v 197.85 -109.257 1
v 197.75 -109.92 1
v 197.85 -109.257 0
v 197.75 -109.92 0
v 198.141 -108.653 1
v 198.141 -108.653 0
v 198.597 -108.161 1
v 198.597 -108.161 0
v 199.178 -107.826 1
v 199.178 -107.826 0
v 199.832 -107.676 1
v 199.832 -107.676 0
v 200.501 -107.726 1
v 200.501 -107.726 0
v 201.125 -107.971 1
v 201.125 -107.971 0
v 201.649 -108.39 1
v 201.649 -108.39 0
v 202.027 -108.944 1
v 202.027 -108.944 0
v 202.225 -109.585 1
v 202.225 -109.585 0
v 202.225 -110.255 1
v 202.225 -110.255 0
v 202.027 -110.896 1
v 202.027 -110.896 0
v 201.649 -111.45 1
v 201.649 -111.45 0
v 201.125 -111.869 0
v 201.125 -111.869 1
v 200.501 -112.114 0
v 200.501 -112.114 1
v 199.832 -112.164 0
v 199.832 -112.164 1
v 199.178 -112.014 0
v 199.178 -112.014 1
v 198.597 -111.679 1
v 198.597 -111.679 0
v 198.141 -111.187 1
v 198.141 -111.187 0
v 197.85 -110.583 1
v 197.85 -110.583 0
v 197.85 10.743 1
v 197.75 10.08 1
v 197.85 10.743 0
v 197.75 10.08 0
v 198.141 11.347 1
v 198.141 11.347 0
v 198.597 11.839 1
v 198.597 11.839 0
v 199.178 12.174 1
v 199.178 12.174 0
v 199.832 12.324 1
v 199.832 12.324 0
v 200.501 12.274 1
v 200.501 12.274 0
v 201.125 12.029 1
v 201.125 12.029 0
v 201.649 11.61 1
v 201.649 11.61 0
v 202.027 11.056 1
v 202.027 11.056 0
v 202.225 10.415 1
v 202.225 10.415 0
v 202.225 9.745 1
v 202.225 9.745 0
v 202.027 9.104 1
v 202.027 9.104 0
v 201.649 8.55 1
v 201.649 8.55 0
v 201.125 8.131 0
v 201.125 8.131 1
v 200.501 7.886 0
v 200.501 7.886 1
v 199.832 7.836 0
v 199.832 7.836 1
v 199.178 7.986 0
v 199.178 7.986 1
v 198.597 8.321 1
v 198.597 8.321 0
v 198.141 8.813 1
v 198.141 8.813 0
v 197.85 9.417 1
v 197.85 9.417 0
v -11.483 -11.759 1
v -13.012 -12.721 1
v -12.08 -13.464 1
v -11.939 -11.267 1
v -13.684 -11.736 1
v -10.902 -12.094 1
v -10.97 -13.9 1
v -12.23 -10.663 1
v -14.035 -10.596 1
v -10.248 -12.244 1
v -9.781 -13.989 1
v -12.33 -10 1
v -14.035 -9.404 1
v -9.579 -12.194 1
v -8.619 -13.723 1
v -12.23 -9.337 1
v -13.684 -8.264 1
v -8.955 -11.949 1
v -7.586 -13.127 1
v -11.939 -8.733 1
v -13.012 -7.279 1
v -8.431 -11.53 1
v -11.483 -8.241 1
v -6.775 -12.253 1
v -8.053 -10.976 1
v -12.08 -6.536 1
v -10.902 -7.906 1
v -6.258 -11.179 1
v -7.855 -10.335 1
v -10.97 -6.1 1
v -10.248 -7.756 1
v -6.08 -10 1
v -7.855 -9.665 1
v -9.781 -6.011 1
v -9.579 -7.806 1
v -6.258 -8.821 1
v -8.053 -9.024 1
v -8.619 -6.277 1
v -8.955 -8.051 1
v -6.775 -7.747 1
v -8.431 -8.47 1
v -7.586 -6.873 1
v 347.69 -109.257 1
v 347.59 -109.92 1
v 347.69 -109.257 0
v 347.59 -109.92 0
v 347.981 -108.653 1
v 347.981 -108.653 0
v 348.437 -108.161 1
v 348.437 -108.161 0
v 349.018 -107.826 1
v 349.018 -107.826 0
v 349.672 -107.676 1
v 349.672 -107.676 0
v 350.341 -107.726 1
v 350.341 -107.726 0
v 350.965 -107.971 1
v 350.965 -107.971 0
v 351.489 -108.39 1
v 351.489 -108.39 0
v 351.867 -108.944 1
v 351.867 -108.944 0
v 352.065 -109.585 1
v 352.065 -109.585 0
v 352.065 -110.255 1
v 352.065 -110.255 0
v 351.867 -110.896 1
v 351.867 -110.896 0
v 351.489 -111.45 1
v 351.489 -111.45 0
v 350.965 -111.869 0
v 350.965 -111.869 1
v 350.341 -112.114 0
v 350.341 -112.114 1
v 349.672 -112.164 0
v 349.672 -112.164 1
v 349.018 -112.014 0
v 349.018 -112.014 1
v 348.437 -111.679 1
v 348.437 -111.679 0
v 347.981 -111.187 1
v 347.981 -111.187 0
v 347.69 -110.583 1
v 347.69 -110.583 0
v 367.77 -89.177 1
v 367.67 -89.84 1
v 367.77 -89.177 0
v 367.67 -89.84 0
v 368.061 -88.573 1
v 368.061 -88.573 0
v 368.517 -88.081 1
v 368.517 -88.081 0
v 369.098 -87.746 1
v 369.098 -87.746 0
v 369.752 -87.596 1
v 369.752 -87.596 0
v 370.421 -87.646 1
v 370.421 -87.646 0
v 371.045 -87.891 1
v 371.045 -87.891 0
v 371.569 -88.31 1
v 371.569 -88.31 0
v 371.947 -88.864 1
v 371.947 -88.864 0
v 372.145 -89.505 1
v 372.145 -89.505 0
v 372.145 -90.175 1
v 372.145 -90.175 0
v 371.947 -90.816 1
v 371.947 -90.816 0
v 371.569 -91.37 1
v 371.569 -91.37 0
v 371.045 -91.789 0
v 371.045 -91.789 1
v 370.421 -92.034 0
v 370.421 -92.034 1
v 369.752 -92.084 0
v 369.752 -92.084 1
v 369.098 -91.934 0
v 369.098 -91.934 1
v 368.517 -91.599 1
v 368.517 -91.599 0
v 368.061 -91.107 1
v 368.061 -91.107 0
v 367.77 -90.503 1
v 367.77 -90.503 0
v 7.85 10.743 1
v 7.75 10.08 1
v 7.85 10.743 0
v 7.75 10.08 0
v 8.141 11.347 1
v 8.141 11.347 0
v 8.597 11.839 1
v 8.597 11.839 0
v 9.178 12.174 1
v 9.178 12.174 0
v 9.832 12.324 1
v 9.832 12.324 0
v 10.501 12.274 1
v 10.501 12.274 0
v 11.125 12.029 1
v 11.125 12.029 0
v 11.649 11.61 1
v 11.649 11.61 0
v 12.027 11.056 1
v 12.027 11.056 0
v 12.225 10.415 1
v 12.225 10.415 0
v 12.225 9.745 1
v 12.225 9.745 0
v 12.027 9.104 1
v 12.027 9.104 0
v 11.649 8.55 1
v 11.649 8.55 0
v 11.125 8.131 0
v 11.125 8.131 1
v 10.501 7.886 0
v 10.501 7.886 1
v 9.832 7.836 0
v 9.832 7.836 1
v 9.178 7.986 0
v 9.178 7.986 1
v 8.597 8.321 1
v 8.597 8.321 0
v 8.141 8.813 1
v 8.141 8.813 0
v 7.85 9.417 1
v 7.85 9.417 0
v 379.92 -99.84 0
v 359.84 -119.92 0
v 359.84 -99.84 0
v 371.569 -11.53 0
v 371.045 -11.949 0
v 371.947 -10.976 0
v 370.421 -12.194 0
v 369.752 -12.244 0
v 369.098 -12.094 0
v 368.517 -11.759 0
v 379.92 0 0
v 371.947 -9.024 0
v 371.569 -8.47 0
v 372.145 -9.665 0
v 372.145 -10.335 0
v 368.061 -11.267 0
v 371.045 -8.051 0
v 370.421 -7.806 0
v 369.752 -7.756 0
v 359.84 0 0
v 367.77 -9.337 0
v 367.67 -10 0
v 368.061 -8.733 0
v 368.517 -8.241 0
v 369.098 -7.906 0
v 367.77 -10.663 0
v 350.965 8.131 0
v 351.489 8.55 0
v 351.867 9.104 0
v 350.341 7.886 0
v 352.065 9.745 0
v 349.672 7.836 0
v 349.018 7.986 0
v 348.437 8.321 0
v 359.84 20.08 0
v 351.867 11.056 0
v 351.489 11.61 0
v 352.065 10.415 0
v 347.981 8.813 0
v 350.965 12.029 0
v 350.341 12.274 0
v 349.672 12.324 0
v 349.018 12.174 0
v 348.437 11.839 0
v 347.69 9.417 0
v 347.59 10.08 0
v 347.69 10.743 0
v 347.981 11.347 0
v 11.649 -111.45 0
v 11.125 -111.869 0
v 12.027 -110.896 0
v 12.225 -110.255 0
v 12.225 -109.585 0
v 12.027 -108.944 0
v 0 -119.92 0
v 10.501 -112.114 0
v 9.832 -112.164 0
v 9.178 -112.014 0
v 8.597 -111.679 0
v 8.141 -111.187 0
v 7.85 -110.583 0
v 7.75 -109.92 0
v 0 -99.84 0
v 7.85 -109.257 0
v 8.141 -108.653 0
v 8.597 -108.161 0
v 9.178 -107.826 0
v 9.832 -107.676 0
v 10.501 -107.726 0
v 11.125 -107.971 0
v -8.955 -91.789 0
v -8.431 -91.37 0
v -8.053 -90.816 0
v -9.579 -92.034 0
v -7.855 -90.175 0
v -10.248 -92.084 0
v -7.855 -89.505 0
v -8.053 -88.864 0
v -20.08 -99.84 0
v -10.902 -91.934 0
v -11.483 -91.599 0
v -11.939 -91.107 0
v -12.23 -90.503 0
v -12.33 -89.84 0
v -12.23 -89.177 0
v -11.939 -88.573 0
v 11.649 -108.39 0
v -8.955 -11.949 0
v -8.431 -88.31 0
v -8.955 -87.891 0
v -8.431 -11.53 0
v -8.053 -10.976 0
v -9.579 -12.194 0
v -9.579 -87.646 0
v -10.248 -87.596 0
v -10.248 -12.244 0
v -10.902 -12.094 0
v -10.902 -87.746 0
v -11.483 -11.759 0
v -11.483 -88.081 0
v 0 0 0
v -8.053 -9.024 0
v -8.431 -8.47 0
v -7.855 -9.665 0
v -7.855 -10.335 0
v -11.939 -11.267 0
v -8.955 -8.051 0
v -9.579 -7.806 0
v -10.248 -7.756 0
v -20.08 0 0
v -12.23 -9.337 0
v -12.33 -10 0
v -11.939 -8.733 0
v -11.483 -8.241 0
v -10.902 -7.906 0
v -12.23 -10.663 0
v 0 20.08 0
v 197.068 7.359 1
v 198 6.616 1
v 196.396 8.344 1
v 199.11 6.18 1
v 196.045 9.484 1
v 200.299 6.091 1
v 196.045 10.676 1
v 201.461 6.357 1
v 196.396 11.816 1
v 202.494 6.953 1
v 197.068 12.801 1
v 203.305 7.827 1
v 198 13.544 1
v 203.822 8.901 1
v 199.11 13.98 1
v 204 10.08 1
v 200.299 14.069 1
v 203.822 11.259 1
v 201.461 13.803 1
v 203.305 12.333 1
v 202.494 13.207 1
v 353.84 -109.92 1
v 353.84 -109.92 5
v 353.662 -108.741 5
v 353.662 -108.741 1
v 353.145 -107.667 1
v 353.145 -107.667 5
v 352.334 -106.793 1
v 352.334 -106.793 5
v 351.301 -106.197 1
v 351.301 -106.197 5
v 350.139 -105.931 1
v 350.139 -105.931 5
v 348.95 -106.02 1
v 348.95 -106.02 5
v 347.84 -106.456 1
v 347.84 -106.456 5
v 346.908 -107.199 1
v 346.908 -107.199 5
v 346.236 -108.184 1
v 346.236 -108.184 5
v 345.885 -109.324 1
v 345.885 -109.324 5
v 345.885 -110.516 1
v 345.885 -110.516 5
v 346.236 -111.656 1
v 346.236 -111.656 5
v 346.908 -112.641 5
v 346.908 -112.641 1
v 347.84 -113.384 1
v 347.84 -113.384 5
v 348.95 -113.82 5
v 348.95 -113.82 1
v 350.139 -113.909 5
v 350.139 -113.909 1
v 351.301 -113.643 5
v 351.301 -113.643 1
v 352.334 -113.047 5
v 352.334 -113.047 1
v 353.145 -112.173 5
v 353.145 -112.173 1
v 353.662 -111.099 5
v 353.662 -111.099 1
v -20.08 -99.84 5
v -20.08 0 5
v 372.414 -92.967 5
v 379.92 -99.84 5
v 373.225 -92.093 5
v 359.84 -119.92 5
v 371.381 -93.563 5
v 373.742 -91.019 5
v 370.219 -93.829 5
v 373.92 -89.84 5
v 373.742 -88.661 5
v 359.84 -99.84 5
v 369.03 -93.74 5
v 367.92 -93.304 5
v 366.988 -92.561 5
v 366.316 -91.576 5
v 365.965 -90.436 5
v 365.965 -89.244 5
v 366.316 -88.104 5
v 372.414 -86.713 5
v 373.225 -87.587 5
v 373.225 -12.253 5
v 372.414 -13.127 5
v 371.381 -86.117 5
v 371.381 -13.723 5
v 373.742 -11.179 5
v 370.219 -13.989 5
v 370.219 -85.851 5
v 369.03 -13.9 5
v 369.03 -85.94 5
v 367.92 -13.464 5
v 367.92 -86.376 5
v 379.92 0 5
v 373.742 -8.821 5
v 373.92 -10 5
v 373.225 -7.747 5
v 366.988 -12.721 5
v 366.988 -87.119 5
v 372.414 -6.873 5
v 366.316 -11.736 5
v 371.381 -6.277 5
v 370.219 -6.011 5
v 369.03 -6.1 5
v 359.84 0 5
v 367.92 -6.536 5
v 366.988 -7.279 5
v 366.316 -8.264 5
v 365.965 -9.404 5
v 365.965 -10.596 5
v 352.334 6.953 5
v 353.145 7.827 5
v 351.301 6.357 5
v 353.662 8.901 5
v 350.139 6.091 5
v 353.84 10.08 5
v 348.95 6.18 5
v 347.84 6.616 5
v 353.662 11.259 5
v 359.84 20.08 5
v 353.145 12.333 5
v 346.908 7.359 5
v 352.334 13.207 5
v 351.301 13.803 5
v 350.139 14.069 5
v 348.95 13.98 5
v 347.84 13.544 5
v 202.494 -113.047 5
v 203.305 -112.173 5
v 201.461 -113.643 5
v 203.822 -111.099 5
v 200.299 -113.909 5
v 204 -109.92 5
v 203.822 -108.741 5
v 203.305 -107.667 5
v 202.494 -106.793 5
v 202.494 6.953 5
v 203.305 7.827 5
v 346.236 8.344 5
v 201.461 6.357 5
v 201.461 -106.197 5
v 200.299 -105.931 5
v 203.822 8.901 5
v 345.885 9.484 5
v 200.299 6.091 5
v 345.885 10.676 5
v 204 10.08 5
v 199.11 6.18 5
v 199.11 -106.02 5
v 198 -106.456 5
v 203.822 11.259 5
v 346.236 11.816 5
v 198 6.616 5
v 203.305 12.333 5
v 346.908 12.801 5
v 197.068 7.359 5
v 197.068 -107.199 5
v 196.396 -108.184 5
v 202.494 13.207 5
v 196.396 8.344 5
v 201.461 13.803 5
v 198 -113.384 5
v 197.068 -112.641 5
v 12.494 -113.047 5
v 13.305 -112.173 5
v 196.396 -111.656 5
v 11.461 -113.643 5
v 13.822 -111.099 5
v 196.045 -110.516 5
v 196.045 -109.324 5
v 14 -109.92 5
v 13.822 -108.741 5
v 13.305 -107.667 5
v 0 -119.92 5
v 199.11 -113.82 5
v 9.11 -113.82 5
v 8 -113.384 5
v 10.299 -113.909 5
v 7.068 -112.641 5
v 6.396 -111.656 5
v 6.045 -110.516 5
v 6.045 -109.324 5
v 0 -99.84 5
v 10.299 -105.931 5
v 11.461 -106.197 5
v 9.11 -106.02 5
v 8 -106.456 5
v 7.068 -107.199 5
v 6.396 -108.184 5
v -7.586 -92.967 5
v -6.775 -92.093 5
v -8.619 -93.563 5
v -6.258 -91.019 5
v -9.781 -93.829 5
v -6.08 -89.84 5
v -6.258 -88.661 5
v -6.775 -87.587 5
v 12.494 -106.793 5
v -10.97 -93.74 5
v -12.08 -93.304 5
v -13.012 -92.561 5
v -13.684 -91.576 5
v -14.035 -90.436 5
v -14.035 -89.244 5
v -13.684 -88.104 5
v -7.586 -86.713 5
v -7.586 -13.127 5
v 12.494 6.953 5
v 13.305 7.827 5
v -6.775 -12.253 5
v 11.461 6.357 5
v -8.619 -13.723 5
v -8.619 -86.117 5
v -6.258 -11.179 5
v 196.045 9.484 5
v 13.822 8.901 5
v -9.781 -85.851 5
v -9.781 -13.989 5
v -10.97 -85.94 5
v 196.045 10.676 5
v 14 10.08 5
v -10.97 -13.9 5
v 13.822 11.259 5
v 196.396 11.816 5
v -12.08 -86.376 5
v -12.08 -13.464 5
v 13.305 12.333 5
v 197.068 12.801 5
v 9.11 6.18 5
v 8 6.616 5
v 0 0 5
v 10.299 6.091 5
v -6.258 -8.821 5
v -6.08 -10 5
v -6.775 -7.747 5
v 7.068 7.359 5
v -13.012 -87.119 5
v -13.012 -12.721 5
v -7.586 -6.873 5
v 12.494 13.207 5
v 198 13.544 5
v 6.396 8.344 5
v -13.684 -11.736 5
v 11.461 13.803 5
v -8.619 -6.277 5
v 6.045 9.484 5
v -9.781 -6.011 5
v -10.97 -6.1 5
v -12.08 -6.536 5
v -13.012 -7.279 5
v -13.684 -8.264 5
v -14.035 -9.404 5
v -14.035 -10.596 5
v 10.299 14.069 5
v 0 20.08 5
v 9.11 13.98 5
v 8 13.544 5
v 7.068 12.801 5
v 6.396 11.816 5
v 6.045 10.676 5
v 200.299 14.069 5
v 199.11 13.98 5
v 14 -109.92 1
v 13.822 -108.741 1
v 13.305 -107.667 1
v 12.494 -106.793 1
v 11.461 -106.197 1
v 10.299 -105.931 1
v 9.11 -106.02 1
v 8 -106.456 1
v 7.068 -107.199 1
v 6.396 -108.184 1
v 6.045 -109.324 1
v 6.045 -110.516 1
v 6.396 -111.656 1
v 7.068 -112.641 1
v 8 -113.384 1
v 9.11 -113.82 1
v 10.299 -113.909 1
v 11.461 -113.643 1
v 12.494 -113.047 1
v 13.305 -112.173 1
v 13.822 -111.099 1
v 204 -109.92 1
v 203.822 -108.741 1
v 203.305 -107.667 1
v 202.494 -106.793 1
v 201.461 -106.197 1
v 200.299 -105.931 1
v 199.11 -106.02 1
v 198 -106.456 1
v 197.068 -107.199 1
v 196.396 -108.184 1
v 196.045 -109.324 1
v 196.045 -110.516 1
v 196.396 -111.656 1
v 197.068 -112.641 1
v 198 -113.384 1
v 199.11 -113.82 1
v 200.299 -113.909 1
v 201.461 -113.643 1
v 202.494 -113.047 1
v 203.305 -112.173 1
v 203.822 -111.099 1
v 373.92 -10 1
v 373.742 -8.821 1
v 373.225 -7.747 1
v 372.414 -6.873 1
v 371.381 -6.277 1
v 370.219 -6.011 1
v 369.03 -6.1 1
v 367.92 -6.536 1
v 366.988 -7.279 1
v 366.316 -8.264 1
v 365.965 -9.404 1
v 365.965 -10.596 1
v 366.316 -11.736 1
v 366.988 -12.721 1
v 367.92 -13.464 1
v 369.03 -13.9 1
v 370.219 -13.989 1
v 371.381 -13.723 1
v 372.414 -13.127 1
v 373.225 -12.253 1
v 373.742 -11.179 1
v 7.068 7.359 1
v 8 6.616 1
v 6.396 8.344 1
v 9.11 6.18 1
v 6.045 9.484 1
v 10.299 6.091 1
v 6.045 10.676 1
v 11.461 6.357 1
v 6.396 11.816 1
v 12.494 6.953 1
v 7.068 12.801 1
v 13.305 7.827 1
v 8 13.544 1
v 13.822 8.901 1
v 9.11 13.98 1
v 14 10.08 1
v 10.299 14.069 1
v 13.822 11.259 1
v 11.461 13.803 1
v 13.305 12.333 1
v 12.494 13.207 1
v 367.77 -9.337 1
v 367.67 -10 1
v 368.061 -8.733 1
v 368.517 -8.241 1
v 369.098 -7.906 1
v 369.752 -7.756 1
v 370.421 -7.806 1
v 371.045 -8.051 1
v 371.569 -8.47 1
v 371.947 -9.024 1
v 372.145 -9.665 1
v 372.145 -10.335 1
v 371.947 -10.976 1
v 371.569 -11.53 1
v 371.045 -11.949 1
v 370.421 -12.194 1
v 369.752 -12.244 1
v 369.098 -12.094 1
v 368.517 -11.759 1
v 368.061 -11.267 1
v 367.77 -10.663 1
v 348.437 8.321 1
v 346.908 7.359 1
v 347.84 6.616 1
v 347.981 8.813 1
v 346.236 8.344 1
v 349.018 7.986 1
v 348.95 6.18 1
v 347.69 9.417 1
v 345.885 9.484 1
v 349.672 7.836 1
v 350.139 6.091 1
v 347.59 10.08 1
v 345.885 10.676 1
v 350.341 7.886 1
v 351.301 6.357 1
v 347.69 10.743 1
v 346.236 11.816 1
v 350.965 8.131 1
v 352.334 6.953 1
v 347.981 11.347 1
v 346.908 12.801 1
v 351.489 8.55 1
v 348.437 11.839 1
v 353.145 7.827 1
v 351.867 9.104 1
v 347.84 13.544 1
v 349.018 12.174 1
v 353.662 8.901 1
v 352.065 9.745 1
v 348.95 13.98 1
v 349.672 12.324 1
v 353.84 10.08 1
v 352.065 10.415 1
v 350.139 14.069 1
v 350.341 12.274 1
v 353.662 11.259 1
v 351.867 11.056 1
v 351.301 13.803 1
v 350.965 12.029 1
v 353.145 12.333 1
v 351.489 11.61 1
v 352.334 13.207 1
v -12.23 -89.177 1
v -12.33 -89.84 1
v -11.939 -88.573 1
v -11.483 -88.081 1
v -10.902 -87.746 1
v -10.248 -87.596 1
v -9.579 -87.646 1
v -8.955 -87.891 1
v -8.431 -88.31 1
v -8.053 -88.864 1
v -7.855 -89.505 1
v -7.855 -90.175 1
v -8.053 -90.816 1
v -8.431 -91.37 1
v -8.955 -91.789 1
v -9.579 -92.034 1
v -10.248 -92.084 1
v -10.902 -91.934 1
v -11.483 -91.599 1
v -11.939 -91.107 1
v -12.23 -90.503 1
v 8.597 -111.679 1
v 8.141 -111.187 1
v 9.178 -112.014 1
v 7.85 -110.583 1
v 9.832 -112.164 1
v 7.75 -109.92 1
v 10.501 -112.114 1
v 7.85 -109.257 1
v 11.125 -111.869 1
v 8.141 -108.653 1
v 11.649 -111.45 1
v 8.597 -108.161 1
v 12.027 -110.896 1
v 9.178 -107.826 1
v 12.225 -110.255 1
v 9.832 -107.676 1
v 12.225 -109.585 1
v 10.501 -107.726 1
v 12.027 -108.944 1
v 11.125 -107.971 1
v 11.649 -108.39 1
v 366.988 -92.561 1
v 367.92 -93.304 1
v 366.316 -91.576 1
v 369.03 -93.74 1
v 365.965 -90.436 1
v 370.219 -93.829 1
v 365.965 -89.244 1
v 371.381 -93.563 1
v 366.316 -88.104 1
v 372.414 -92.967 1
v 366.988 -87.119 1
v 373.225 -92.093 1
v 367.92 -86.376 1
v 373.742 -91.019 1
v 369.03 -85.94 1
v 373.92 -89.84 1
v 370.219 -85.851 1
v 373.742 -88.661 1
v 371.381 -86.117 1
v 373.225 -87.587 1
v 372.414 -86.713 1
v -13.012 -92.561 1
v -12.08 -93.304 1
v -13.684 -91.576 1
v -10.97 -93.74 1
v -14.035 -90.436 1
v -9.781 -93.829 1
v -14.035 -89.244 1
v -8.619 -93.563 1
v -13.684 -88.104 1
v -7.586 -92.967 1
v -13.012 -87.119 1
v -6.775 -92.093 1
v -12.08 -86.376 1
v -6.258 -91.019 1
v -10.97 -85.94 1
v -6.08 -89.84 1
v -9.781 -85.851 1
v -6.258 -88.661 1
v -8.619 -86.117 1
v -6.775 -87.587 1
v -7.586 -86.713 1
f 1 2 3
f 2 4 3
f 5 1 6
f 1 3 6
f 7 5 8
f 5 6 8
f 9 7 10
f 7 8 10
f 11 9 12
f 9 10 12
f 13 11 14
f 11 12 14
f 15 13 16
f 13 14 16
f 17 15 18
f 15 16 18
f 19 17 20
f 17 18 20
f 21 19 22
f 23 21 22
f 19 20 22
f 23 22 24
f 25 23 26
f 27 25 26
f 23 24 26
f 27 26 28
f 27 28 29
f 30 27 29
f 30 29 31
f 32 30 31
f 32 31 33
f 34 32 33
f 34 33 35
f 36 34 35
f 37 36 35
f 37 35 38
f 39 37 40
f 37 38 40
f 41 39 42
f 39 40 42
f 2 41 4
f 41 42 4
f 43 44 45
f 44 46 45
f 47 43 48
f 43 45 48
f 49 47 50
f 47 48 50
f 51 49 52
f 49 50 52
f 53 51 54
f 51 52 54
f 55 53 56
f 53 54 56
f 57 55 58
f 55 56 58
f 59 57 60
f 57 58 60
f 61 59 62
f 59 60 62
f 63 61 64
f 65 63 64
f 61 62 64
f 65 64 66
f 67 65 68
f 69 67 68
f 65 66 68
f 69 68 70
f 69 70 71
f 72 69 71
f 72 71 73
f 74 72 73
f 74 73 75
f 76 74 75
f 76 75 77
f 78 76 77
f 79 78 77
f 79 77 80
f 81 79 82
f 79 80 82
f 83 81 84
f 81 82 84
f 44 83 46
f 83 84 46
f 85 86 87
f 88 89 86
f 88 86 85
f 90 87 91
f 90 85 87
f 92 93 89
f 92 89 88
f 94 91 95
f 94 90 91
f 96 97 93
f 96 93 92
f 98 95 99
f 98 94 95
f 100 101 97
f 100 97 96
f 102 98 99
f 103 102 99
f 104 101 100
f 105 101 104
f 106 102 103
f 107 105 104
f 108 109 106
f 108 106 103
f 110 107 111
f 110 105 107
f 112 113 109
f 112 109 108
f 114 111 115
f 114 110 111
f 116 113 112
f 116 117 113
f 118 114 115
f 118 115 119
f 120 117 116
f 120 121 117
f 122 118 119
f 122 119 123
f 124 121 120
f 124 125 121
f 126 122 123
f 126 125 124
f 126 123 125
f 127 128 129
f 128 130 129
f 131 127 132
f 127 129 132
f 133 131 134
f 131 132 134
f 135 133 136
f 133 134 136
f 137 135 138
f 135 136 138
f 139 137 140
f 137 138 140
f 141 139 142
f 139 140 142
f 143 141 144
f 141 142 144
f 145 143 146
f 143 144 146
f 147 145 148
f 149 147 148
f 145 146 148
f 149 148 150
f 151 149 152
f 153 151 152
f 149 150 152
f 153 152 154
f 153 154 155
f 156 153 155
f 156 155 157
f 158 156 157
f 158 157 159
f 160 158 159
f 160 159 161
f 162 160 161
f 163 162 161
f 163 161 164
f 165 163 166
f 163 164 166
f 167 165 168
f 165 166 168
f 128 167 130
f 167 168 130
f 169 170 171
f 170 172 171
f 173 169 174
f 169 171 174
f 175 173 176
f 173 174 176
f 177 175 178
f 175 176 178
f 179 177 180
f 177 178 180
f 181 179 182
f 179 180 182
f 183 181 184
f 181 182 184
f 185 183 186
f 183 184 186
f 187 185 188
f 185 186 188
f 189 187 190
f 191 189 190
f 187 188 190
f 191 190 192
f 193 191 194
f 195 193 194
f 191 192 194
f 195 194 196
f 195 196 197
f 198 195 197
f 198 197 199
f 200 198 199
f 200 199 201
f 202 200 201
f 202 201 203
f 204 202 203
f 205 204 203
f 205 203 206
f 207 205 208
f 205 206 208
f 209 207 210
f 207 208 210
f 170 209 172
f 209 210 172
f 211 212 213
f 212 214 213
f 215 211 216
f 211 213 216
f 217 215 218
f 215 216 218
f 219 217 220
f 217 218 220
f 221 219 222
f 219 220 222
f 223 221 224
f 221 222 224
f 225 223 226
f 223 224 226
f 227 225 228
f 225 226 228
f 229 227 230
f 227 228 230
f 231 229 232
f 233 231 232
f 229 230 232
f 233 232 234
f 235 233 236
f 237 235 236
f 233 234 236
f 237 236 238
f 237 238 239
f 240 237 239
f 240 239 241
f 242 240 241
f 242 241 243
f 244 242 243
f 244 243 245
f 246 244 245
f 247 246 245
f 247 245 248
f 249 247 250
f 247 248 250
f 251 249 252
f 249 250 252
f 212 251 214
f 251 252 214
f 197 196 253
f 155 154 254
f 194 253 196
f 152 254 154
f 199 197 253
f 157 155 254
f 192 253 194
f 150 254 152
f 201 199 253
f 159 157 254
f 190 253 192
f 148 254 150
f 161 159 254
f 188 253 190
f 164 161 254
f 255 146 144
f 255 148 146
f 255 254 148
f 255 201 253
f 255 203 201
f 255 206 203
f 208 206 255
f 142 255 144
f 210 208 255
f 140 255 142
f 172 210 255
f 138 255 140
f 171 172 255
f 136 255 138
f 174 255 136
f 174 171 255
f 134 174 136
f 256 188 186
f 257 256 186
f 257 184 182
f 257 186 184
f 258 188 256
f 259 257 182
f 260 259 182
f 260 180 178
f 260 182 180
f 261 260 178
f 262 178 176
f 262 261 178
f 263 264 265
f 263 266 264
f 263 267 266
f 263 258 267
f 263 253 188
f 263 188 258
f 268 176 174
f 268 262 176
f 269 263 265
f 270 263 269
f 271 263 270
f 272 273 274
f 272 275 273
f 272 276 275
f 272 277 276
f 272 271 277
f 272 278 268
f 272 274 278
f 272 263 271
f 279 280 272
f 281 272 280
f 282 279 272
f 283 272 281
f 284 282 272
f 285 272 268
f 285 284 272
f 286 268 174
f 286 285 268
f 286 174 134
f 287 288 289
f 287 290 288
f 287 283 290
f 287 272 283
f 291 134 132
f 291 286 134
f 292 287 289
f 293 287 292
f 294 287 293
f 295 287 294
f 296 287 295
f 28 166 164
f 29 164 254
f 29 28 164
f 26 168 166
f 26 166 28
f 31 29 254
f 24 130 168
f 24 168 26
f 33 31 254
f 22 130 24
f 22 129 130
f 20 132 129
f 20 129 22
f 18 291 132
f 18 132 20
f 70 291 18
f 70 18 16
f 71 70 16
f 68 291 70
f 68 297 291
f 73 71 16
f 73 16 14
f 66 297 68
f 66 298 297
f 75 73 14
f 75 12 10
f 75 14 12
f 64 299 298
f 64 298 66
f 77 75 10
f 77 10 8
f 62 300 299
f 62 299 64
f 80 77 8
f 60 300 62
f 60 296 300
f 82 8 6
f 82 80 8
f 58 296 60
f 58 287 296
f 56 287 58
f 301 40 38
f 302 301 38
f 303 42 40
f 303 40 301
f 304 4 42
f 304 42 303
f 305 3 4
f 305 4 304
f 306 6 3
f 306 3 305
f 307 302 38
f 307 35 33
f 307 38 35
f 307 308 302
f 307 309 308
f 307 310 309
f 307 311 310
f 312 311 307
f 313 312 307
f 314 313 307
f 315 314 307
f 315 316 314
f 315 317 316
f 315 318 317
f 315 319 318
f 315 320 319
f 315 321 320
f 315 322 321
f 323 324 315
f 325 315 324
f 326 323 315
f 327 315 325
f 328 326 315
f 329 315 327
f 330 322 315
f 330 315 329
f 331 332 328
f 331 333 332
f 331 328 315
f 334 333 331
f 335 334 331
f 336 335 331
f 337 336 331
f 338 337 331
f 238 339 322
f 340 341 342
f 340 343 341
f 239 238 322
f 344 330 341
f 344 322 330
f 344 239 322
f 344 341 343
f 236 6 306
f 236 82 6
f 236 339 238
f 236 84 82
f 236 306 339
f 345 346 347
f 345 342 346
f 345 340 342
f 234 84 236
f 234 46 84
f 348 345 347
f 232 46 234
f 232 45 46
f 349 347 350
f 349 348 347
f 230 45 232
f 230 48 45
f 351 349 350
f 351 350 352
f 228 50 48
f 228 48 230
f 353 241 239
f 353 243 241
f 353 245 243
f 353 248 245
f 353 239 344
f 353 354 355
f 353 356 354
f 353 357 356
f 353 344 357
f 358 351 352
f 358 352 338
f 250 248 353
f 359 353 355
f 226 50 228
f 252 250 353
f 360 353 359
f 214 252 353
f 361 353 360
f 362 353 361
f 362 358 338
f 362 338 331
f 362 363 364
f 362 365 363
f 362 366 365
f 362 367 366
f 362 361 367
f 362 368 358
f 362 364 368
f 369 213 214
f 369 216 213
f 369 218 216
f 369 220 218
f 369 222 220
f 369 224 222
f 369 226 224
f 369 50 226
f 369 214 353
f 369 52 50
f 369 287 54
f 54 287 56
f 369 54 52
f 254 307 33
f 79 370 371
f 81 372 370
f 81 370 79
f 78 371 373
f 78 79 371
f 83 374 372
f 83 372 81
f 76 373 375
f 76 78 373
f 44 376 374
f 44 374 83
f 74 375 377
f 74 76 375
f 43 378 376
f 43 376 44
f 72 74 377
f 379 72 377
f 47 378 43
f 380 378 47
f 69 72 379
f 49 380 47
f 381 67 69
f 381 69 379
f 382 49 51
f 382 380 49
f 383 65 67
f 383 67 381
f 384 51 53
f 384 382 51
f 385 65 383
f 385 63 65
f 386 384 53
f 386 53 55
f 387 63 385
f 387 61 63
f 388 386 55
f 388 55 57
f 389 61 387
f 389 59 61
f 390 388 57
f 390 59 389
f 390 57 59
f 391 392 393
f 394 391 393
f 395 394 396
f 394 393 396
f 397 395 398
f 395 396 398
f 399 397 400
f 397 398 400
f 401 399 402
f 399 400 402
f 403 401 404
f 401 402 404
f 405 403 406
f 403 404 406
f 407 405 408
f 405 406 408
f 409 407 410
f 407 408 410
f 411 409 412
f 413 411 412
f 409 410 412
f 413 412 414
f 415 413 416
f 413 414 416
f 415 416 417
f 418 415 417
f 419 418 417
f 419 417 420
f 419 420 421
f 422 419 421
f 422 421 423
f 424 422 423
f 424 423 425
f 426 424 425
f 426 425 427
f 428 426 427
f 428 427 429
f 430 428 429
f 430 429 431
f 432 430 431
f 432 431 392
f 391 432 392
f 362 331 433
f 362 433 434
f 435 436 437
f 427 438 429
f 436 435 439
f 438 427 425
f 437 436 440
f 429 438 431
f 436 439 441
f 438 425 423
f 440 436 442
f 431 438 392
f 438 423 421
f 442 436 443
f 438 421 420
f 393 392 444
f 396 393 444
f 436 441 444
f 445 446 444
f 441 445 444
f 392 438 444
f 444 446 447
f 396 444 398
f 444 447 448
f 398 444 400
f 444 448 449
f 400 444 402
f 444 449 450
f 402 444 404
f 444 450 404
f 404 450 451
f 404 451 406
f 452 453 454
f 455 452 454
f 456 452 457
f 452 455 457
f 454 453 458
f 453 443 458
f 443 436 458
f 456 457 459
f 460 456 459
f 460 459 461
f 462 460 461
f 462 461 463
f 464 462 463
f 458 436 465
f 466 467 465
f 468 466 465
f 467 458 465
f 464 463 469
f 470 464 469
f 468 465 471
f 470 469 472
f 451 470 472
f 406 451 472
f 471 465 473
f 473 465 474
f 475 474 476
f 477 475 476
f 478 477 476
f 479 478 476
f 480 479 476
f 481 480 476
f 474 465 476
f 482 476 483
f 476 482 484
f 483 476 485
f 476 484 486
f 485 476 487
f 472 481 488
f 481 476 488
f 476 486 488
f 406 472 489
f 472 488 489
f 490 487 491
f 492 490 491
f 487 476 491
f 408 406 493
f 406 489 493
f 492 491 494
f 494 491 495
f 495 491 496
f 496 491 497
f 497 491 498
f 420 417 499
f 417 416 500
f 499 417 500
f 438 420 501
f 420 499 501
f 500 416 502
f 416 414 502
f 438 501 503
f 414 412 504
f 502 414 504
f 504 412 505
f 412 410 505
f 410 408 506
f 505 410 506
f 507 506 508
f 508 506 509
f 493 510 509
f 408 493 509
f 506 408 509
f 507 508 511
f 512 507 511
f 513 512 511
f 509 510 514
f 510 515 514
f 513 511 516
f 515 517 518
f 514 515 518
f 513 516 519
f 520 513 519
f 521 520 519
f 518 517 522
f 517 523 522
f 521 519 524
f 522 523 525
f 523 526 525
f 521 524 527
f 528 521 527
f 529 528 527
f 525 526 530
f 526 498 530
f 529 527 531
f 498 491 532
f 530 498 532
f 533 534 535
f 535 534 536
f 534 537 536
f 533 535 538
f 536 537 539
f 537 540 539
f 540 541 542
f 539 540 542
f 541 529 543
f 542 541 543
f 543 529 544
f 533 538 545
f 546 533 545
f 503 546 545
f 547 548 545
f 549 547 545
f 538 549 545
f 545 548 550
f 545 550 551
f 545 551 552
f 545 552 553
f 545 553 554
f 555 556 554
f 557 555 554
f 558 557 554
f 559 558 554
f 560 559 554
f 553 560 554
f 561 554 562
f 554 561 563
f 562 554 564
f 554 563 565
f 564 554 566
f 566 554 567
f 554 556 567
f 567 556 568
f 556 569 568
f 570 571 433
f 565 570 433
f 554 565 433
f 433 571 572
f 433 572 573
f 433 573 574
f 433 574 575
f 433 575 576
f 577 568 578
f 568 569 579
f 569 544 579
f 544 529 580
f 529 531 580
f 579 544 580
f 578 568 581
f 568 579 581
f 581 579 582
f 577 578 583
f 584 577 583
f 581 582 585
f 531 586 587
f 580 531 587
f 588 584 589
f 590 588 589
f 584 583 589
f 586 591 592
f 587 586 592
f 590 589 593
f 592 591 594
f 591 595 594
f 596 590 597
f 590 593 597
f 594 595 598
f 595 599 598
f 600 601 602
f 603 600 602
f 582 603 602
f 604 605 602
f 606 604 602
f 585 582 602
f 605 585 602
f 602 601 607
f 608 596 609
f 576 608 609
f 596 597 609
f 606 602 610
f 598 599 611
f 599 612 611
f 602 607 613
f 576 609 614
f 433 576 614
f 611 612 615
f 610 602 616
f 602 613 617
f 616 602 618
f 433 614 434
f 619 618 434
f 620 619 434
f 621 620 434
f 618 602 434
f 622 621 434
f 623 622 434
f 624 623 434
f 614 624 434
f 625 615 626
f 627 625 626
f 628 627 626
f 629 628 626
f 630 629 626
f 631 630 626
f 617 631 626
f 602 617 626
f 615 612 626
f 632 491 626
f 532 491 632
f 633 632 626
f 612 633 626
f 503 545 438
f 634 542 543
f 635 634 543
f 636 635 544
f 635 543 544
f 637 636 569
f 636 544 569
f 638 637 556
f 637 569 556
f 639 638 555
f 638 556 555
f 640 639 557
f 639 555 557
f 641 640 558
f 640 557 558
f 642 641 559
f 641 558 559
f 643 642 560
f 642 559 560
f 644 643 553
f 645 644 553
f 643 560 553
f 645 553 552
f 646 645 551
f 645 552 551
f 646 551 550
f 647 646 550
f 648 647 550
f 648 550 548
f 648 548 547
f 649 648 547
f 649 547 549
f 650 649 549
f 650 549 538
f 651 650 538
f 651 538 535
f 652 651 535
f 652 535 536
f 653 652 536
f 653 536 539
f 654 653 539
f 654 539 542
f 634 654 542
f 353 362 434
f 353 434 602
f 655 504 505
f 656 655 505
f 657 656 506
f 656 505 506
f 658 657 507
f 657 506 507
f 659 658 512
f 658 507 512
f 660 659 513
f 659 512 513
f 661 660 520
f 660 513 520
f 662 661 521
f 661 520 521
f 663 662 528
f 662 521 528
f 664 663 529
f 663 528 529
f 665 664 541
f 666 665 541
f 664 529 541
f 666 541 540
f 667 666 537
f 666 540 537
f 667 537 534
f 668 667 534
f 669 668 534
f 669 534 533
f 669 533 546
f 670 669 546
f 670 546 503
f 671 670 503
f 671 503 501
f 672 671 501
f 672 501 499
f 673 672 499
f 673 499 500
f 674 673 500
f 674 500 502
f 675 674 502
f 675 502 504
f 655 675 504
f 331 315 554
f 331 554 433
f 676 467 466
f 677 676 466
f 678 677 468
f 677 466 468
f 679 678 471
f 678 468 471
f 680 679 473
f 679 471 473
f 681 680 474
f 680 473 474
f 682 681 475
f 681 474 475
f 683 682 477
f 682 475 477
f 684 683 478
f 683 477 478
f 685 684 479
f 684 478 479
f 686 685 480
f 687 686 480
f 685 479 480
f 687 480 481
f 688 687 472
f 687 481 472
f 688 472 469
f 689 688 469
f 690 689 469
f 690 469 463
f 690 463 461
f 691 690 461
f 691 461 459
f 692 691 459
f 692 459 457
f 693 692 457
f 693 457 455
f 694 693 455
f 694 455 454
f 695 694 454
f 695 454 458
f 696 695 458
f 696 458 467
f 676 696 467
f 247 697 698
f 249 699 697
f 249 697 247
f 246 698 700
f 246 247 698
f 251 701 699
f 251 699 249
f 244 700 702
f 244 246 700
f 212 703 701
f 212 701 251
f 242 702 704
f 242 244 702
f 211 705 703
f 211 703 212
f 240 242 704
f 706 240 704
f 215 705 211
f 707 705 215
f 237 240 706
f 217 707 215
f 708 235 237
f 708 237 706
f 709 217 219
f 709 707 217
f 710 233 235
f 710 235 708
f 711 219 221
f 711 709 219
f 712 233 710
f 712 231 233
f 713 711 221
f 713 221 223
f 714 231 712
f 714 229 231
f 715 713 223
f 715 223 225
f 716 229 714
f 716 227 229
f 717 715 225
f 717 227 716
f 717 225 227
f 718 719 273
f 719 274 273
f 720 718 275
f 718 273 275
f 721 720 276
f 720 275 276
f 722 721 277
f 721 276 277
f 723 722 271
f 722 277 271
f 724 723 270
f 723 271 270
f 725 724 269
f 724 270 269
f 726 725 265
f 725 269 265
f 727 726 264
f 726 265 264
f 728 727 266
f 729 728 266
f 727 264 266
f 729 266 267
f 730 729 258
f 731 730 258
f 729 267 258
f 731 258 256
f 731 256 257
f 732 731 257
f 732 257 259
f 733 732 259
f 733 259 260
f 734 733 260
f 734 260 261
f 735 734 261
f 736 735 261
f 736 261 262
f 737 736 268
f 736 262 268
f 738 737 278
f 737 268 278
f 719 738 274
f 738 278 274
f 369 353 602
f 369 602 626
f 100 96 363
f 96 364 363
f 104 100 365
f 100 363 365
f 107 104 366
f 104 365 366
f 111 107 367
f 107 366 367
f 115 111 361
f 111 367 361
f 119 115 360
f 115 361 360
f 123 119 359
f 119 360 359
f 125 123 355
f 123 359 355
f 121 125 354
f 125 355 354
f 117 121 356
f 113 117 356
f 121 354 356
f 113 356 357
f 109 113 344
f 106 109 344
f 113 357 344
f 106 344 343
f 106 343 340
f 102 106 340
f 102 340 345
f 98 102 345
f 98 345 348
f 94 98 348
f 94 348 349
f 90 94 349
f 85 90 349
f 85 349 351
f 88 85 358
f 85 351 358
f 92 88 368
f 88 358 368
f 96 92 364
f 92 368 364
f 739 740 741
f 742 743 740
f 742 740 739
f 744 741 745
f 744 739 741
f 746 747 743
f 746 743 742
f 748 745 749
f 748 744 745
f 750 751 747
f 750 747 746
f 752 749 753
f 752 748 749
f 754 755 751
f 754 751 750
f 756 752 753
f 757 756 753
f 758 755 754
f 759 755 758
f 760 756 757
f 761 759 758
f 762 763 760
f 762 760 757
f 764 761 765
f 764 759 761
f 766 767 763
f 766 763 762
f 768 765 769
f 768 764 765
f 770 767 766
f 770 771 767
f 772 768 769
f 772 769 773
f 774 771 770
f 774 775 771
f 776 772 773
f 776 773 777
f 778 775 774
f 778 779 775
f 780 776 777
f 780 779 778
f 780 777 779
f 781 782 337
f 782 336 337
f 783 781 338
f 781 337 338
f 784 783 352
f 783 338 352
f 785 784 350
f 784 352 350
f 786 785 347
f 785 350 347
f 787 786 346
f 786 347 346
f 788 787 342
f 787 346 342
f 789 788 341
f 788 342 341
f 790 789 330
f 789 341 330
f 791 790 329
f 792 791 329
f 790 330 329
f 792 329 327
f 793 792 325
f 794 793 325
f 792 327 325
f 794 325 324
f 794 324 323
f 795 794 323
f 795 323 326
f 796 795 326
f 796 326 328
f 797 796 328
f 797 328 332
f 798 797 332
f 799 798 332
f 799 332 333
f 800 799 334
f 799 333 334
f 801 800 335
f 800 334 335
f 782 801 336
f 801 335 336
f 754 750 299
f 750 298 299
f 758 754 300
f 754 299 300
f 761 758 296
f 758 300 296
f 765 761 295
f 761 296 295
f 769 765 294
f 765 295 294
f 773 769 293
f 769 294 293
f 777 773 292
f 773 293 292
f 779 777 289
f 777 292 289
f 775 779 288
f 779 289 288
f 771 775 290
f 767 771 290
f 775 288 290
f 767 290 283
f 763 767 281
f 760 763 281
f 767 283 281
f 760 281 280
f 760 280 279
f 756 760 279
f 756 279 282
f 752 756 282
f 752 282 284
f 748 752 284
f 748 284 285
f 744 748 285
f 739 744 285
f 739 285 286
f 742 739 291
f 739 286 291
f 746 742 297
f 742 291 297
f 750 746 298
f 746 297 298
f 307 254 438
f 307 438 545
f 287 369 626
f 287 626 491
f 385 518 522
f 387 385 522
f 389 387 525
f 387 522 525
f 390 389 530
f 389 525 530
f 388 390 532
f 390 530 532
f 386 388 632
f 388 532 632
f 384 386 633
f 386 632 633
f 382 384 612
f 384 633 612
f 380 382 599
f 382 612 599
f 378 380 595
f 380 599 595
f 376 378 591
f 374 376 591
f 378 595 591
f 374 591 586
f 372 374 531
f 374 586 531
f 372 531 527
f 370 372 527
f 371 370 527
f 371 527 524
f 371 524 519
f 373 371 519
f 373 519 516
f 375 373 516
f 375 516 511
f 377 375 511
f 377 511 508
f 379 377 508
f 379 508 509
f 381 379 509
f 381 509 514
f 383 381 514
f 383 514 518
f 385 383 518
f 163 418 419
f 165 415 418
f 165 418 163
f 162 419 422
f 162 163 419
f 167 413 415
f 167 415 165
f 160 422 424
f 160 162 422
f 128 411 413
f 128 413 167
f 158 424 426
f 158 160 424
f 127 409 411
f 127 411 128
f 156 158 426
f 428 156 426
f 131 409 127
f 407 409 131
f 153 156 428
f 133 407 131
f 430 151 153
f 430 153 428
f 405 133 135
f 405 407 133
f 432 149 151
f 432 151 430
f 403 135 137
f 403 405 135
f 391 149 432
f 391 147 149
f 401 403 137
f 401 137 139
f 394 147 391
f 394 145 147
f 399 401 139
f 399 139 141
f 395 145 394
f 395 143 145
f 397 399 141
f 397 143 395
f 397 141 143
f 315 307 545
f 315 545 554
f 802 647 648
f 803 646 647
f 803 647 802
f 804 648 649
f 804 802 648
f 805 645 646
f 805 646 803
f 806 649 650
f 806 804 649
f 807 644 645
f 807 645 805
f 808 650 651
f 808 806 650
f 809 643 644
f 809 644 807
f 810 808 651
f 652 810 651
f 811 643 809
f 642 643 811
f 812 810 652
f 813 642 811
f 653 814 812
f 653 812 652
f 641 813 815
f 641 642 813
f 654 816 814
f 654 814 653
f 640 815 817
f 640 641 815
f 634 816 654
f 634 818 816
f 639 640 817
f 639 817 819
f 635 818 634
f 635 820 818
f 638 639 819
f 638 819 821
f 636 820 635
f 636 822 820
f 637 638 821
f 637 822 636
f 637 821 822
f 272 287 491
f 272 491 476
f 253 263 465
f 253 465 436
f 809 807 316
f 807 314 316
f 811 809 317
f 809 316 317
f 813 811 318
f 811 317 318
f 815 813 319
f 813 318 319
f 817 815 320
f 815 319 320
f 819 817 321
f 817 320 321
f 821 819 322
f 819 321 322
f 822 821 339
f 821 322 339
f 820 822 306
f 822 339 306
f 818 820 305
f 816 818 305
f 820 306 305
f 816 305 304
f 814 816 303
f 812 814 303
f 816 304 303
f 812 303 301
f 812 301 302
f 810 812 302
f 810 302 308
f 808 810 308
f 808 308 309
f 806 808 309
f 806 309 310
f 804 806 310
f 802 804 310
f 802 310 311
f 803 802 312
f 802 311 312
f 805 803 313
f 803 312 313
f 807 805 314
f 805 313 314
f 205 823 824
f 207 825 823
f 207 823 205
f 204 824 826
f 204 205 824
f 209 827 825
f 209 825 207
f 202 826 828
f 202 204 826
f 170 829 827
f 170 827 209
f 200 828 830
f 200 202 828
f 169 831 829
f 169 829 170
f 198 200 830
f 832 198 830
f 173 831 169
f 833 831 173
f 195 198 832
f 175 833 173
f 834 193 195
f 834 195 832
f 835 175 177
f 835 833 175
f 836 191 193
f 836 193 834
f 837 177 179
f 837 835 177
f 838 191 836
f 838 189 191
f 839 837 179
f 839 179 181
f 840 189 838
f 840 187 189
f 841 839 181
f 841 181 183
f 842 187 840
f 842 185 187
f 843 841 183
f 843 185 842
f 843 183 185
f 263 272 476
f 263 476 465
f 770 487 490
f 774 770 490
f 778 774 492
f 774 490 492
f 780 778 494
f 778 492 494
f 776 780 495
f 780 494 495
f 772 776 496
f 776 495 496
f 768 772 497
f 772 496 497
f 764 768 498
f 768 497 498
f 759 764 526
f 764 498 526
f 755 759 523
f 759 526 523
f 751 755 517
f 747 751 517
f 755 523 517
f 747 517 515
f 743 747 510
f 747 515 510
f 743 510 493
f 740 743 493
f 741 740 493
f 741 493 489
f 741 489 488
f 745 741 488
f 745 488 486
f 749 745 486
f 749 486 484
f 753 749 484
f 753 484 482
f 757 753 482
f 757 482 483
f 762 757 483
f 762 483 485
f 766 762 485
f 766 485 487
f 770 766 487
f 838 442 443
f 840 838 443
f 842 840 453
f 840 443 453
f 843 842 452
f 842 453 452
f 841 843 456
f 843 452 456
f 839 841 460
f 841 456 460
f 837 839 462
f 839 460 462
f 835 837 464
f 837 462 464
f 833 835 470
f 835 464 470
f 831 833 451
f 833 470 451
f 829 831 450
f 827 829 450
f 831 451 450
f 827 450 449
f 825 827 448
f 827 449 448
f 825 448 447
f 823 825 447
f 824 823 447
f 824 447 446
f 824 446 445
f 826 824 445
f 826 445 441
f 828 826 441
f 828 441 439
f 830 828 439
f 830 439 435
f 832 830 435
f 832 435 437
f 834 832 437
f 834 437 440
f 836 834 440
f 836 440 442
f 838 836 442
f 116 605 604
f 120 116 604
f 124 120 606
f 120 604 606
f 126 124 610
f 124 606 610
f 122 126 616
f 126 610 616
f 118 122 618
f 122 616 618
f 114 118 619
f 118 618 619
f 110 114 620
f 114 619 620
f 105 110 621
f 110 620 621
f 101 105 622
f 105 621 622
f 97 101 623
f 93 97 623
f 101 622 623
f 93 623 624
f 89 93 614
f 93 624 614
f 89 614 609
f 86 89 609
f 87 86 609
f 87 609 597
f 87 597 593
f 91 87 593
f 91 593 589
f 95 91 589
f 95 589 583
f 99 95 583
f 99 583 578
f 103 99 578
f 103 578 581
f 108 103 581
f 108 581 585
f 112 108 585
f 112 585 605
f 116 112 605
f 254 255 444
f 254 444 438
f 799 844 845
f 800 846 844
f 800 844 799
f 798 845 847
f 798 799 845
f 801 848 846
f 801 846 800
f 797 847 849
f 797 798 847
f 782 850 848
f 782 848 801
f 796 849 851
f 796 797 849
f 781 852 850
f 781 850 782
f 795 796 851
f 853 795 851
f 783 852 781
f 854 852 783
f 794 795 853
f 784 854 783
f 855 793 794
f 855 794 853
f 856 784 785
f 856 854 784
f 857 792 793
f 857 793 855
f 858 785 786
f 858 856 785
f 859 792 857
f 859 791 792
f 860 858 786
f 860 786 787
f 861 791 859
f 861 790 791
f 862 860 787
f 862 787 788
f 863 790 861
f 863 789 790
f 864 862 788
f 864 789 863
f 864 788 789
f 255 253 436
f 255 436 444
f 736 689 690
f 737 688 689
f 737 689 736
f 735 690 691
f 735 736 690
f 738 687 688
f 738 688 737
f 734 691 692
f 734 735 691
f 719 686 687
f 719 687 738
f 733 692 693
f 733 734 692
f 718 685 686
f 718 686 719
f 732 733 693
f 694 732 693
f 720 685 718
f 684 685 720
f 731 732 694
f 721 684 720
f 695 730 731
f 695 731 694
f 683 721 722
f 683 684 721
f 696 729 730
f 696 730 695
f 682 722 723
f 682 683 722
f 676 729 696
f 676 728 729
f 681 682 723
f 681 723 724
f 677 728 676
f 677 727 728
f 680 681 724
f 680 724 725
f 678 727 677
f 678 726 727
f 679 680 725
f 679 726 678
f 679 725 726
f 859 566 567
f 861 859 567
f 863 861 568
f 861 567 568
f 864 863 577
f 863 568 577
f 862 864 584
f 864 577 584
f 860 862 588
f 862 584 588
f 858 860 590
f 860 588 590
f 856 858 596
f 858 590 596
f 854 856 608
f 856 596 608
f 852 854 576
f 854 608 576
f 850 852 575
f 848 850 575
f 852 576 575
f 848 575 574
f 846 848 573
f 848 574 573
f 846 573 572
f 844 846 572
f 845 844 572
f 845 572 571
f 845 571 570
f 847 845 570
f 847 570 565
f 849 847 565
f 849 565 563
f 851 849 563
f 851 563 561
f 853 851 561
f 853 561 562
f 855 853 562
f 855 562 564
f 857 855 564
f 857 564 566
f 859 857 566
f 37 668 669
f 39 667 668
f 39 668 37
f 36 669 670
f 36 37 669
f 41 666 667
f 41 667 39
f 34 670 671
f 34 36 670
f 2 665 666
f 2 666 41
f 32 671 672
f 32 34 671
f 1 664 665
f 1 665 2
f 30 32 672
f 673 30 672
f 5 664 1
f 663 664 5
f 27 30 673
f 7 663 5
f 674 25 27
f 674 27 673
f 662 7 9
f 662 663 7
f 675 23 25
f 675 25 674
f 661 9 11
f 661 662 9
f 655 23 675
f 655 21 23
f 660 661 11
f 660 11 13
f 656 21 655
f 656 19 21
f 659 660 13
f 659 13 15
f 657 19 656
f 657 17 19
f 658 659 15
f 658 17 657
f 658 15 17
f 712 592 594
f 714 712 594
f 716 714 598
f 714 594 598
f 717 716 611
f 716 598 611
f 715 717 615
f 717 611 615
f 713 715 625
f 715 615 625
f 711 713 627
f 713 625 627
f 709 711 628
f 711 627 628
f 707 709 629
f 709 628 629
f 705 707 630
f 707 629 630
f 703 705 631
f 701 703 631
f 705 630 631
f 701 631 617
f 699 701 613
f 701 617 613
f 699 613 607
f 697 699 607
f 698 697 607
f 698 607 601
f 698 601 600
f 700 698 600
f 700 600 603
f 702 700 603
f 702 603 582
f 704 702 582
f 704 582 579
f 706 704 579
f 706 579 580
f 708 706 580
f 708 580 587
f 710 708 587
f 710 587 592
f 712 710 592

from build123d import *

# Parameters (mm, degrees)
EXTRUDE_1_DEPTH              = 5
HOLE_WIZARD_M4_1_D           = 4.5
HOLE_WIZARD_M4_1_CBORE_D     = 8
HOLE_WIZARD_M4_1_CBORE_DEPTH = 4


with BuildPart() as part:
    # 스케치1 → 보스-돌출1 (new body)
    with BuildSketch(Plane.XY):
        Polygon((-20.08, 0), (0, 0), (0, 20.08), (359.84, 20.08), (359.84, 0), (379.92, 0), (379.92, -99.84), (359.84, -99.84), (359.84, -119.92), (0, -119.92), (0, -99.84), (-20.08, -99.84), align=None)
    extrude(amount=EXTRUDE_1_DEPTH)

    # M4 소켓 머리 캡 나사용 카운터보어1 (through all)
    with Locations(Plane.XY.offset(5)):
        with Locations((-10.08, -10), (-10.08, -89.84), (10, -109.92), (200, -109.92), (349.84, -109.92), (369.92, -89.84), (369.92, -10), (349.84, 10.08), (200, 10.08), (10, 10.08)):
            CounterBoreHole(HOLE_WIZARD_M4_1_D / 2, HOLE_WIZARD_M4_1_CBORE_D / 2, HOLE_WIZARD_M4_1_CBORE_DEPTH)


solid = part.part
